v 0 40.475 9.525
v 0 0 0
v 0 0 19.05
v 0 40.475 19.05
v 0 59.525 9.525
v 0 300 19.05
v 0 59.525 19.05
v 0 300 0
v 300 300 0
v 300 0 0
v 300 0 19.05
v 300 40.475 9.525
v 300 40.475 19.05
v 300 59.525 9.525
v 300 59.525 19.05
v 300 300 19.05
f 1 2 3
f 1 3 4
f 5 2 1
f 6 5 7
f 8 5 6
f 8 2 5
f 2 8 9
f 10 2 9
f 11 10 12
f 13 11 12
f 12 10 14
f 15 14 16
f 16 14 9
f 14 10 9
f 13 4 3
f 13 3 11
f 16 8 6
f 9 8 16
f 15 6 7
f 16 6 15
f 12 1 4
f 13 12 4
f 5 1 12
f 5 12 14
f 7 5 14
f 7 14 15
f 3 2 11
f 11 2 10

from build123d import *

# Parameters (mm, degrees)
SKETCH_W     = 300
SKETCH_H     = 300
PAD_DEPTH    = 19.05
SKETCH001_W  = 19.05
SKETCH001_H  = 9.525
POCKET_DEPTH = 300.001


with BuildPart() as part:
    # Sketch → Pad (new body)
    with BuildSketch(Plane.XY):
        with Locations((150, 150)):
            Rectangle(SKETCH_W, SKETCH_H)
    extrude(amount=PAD_DEPTH)

    # Sketch001 (on Face2 of Pad) → Pocket (cut, through all)
    with BuildSketch(Plane.YZ.offset(300)):
        with Locations((50, 14.2875)):
            Rectangle(SKETCH001_W, SKETCH001_H)
    extrude(amount=-POCKET_DEPTH, mode=Mode.SUBTRACT)


solid = part.part
